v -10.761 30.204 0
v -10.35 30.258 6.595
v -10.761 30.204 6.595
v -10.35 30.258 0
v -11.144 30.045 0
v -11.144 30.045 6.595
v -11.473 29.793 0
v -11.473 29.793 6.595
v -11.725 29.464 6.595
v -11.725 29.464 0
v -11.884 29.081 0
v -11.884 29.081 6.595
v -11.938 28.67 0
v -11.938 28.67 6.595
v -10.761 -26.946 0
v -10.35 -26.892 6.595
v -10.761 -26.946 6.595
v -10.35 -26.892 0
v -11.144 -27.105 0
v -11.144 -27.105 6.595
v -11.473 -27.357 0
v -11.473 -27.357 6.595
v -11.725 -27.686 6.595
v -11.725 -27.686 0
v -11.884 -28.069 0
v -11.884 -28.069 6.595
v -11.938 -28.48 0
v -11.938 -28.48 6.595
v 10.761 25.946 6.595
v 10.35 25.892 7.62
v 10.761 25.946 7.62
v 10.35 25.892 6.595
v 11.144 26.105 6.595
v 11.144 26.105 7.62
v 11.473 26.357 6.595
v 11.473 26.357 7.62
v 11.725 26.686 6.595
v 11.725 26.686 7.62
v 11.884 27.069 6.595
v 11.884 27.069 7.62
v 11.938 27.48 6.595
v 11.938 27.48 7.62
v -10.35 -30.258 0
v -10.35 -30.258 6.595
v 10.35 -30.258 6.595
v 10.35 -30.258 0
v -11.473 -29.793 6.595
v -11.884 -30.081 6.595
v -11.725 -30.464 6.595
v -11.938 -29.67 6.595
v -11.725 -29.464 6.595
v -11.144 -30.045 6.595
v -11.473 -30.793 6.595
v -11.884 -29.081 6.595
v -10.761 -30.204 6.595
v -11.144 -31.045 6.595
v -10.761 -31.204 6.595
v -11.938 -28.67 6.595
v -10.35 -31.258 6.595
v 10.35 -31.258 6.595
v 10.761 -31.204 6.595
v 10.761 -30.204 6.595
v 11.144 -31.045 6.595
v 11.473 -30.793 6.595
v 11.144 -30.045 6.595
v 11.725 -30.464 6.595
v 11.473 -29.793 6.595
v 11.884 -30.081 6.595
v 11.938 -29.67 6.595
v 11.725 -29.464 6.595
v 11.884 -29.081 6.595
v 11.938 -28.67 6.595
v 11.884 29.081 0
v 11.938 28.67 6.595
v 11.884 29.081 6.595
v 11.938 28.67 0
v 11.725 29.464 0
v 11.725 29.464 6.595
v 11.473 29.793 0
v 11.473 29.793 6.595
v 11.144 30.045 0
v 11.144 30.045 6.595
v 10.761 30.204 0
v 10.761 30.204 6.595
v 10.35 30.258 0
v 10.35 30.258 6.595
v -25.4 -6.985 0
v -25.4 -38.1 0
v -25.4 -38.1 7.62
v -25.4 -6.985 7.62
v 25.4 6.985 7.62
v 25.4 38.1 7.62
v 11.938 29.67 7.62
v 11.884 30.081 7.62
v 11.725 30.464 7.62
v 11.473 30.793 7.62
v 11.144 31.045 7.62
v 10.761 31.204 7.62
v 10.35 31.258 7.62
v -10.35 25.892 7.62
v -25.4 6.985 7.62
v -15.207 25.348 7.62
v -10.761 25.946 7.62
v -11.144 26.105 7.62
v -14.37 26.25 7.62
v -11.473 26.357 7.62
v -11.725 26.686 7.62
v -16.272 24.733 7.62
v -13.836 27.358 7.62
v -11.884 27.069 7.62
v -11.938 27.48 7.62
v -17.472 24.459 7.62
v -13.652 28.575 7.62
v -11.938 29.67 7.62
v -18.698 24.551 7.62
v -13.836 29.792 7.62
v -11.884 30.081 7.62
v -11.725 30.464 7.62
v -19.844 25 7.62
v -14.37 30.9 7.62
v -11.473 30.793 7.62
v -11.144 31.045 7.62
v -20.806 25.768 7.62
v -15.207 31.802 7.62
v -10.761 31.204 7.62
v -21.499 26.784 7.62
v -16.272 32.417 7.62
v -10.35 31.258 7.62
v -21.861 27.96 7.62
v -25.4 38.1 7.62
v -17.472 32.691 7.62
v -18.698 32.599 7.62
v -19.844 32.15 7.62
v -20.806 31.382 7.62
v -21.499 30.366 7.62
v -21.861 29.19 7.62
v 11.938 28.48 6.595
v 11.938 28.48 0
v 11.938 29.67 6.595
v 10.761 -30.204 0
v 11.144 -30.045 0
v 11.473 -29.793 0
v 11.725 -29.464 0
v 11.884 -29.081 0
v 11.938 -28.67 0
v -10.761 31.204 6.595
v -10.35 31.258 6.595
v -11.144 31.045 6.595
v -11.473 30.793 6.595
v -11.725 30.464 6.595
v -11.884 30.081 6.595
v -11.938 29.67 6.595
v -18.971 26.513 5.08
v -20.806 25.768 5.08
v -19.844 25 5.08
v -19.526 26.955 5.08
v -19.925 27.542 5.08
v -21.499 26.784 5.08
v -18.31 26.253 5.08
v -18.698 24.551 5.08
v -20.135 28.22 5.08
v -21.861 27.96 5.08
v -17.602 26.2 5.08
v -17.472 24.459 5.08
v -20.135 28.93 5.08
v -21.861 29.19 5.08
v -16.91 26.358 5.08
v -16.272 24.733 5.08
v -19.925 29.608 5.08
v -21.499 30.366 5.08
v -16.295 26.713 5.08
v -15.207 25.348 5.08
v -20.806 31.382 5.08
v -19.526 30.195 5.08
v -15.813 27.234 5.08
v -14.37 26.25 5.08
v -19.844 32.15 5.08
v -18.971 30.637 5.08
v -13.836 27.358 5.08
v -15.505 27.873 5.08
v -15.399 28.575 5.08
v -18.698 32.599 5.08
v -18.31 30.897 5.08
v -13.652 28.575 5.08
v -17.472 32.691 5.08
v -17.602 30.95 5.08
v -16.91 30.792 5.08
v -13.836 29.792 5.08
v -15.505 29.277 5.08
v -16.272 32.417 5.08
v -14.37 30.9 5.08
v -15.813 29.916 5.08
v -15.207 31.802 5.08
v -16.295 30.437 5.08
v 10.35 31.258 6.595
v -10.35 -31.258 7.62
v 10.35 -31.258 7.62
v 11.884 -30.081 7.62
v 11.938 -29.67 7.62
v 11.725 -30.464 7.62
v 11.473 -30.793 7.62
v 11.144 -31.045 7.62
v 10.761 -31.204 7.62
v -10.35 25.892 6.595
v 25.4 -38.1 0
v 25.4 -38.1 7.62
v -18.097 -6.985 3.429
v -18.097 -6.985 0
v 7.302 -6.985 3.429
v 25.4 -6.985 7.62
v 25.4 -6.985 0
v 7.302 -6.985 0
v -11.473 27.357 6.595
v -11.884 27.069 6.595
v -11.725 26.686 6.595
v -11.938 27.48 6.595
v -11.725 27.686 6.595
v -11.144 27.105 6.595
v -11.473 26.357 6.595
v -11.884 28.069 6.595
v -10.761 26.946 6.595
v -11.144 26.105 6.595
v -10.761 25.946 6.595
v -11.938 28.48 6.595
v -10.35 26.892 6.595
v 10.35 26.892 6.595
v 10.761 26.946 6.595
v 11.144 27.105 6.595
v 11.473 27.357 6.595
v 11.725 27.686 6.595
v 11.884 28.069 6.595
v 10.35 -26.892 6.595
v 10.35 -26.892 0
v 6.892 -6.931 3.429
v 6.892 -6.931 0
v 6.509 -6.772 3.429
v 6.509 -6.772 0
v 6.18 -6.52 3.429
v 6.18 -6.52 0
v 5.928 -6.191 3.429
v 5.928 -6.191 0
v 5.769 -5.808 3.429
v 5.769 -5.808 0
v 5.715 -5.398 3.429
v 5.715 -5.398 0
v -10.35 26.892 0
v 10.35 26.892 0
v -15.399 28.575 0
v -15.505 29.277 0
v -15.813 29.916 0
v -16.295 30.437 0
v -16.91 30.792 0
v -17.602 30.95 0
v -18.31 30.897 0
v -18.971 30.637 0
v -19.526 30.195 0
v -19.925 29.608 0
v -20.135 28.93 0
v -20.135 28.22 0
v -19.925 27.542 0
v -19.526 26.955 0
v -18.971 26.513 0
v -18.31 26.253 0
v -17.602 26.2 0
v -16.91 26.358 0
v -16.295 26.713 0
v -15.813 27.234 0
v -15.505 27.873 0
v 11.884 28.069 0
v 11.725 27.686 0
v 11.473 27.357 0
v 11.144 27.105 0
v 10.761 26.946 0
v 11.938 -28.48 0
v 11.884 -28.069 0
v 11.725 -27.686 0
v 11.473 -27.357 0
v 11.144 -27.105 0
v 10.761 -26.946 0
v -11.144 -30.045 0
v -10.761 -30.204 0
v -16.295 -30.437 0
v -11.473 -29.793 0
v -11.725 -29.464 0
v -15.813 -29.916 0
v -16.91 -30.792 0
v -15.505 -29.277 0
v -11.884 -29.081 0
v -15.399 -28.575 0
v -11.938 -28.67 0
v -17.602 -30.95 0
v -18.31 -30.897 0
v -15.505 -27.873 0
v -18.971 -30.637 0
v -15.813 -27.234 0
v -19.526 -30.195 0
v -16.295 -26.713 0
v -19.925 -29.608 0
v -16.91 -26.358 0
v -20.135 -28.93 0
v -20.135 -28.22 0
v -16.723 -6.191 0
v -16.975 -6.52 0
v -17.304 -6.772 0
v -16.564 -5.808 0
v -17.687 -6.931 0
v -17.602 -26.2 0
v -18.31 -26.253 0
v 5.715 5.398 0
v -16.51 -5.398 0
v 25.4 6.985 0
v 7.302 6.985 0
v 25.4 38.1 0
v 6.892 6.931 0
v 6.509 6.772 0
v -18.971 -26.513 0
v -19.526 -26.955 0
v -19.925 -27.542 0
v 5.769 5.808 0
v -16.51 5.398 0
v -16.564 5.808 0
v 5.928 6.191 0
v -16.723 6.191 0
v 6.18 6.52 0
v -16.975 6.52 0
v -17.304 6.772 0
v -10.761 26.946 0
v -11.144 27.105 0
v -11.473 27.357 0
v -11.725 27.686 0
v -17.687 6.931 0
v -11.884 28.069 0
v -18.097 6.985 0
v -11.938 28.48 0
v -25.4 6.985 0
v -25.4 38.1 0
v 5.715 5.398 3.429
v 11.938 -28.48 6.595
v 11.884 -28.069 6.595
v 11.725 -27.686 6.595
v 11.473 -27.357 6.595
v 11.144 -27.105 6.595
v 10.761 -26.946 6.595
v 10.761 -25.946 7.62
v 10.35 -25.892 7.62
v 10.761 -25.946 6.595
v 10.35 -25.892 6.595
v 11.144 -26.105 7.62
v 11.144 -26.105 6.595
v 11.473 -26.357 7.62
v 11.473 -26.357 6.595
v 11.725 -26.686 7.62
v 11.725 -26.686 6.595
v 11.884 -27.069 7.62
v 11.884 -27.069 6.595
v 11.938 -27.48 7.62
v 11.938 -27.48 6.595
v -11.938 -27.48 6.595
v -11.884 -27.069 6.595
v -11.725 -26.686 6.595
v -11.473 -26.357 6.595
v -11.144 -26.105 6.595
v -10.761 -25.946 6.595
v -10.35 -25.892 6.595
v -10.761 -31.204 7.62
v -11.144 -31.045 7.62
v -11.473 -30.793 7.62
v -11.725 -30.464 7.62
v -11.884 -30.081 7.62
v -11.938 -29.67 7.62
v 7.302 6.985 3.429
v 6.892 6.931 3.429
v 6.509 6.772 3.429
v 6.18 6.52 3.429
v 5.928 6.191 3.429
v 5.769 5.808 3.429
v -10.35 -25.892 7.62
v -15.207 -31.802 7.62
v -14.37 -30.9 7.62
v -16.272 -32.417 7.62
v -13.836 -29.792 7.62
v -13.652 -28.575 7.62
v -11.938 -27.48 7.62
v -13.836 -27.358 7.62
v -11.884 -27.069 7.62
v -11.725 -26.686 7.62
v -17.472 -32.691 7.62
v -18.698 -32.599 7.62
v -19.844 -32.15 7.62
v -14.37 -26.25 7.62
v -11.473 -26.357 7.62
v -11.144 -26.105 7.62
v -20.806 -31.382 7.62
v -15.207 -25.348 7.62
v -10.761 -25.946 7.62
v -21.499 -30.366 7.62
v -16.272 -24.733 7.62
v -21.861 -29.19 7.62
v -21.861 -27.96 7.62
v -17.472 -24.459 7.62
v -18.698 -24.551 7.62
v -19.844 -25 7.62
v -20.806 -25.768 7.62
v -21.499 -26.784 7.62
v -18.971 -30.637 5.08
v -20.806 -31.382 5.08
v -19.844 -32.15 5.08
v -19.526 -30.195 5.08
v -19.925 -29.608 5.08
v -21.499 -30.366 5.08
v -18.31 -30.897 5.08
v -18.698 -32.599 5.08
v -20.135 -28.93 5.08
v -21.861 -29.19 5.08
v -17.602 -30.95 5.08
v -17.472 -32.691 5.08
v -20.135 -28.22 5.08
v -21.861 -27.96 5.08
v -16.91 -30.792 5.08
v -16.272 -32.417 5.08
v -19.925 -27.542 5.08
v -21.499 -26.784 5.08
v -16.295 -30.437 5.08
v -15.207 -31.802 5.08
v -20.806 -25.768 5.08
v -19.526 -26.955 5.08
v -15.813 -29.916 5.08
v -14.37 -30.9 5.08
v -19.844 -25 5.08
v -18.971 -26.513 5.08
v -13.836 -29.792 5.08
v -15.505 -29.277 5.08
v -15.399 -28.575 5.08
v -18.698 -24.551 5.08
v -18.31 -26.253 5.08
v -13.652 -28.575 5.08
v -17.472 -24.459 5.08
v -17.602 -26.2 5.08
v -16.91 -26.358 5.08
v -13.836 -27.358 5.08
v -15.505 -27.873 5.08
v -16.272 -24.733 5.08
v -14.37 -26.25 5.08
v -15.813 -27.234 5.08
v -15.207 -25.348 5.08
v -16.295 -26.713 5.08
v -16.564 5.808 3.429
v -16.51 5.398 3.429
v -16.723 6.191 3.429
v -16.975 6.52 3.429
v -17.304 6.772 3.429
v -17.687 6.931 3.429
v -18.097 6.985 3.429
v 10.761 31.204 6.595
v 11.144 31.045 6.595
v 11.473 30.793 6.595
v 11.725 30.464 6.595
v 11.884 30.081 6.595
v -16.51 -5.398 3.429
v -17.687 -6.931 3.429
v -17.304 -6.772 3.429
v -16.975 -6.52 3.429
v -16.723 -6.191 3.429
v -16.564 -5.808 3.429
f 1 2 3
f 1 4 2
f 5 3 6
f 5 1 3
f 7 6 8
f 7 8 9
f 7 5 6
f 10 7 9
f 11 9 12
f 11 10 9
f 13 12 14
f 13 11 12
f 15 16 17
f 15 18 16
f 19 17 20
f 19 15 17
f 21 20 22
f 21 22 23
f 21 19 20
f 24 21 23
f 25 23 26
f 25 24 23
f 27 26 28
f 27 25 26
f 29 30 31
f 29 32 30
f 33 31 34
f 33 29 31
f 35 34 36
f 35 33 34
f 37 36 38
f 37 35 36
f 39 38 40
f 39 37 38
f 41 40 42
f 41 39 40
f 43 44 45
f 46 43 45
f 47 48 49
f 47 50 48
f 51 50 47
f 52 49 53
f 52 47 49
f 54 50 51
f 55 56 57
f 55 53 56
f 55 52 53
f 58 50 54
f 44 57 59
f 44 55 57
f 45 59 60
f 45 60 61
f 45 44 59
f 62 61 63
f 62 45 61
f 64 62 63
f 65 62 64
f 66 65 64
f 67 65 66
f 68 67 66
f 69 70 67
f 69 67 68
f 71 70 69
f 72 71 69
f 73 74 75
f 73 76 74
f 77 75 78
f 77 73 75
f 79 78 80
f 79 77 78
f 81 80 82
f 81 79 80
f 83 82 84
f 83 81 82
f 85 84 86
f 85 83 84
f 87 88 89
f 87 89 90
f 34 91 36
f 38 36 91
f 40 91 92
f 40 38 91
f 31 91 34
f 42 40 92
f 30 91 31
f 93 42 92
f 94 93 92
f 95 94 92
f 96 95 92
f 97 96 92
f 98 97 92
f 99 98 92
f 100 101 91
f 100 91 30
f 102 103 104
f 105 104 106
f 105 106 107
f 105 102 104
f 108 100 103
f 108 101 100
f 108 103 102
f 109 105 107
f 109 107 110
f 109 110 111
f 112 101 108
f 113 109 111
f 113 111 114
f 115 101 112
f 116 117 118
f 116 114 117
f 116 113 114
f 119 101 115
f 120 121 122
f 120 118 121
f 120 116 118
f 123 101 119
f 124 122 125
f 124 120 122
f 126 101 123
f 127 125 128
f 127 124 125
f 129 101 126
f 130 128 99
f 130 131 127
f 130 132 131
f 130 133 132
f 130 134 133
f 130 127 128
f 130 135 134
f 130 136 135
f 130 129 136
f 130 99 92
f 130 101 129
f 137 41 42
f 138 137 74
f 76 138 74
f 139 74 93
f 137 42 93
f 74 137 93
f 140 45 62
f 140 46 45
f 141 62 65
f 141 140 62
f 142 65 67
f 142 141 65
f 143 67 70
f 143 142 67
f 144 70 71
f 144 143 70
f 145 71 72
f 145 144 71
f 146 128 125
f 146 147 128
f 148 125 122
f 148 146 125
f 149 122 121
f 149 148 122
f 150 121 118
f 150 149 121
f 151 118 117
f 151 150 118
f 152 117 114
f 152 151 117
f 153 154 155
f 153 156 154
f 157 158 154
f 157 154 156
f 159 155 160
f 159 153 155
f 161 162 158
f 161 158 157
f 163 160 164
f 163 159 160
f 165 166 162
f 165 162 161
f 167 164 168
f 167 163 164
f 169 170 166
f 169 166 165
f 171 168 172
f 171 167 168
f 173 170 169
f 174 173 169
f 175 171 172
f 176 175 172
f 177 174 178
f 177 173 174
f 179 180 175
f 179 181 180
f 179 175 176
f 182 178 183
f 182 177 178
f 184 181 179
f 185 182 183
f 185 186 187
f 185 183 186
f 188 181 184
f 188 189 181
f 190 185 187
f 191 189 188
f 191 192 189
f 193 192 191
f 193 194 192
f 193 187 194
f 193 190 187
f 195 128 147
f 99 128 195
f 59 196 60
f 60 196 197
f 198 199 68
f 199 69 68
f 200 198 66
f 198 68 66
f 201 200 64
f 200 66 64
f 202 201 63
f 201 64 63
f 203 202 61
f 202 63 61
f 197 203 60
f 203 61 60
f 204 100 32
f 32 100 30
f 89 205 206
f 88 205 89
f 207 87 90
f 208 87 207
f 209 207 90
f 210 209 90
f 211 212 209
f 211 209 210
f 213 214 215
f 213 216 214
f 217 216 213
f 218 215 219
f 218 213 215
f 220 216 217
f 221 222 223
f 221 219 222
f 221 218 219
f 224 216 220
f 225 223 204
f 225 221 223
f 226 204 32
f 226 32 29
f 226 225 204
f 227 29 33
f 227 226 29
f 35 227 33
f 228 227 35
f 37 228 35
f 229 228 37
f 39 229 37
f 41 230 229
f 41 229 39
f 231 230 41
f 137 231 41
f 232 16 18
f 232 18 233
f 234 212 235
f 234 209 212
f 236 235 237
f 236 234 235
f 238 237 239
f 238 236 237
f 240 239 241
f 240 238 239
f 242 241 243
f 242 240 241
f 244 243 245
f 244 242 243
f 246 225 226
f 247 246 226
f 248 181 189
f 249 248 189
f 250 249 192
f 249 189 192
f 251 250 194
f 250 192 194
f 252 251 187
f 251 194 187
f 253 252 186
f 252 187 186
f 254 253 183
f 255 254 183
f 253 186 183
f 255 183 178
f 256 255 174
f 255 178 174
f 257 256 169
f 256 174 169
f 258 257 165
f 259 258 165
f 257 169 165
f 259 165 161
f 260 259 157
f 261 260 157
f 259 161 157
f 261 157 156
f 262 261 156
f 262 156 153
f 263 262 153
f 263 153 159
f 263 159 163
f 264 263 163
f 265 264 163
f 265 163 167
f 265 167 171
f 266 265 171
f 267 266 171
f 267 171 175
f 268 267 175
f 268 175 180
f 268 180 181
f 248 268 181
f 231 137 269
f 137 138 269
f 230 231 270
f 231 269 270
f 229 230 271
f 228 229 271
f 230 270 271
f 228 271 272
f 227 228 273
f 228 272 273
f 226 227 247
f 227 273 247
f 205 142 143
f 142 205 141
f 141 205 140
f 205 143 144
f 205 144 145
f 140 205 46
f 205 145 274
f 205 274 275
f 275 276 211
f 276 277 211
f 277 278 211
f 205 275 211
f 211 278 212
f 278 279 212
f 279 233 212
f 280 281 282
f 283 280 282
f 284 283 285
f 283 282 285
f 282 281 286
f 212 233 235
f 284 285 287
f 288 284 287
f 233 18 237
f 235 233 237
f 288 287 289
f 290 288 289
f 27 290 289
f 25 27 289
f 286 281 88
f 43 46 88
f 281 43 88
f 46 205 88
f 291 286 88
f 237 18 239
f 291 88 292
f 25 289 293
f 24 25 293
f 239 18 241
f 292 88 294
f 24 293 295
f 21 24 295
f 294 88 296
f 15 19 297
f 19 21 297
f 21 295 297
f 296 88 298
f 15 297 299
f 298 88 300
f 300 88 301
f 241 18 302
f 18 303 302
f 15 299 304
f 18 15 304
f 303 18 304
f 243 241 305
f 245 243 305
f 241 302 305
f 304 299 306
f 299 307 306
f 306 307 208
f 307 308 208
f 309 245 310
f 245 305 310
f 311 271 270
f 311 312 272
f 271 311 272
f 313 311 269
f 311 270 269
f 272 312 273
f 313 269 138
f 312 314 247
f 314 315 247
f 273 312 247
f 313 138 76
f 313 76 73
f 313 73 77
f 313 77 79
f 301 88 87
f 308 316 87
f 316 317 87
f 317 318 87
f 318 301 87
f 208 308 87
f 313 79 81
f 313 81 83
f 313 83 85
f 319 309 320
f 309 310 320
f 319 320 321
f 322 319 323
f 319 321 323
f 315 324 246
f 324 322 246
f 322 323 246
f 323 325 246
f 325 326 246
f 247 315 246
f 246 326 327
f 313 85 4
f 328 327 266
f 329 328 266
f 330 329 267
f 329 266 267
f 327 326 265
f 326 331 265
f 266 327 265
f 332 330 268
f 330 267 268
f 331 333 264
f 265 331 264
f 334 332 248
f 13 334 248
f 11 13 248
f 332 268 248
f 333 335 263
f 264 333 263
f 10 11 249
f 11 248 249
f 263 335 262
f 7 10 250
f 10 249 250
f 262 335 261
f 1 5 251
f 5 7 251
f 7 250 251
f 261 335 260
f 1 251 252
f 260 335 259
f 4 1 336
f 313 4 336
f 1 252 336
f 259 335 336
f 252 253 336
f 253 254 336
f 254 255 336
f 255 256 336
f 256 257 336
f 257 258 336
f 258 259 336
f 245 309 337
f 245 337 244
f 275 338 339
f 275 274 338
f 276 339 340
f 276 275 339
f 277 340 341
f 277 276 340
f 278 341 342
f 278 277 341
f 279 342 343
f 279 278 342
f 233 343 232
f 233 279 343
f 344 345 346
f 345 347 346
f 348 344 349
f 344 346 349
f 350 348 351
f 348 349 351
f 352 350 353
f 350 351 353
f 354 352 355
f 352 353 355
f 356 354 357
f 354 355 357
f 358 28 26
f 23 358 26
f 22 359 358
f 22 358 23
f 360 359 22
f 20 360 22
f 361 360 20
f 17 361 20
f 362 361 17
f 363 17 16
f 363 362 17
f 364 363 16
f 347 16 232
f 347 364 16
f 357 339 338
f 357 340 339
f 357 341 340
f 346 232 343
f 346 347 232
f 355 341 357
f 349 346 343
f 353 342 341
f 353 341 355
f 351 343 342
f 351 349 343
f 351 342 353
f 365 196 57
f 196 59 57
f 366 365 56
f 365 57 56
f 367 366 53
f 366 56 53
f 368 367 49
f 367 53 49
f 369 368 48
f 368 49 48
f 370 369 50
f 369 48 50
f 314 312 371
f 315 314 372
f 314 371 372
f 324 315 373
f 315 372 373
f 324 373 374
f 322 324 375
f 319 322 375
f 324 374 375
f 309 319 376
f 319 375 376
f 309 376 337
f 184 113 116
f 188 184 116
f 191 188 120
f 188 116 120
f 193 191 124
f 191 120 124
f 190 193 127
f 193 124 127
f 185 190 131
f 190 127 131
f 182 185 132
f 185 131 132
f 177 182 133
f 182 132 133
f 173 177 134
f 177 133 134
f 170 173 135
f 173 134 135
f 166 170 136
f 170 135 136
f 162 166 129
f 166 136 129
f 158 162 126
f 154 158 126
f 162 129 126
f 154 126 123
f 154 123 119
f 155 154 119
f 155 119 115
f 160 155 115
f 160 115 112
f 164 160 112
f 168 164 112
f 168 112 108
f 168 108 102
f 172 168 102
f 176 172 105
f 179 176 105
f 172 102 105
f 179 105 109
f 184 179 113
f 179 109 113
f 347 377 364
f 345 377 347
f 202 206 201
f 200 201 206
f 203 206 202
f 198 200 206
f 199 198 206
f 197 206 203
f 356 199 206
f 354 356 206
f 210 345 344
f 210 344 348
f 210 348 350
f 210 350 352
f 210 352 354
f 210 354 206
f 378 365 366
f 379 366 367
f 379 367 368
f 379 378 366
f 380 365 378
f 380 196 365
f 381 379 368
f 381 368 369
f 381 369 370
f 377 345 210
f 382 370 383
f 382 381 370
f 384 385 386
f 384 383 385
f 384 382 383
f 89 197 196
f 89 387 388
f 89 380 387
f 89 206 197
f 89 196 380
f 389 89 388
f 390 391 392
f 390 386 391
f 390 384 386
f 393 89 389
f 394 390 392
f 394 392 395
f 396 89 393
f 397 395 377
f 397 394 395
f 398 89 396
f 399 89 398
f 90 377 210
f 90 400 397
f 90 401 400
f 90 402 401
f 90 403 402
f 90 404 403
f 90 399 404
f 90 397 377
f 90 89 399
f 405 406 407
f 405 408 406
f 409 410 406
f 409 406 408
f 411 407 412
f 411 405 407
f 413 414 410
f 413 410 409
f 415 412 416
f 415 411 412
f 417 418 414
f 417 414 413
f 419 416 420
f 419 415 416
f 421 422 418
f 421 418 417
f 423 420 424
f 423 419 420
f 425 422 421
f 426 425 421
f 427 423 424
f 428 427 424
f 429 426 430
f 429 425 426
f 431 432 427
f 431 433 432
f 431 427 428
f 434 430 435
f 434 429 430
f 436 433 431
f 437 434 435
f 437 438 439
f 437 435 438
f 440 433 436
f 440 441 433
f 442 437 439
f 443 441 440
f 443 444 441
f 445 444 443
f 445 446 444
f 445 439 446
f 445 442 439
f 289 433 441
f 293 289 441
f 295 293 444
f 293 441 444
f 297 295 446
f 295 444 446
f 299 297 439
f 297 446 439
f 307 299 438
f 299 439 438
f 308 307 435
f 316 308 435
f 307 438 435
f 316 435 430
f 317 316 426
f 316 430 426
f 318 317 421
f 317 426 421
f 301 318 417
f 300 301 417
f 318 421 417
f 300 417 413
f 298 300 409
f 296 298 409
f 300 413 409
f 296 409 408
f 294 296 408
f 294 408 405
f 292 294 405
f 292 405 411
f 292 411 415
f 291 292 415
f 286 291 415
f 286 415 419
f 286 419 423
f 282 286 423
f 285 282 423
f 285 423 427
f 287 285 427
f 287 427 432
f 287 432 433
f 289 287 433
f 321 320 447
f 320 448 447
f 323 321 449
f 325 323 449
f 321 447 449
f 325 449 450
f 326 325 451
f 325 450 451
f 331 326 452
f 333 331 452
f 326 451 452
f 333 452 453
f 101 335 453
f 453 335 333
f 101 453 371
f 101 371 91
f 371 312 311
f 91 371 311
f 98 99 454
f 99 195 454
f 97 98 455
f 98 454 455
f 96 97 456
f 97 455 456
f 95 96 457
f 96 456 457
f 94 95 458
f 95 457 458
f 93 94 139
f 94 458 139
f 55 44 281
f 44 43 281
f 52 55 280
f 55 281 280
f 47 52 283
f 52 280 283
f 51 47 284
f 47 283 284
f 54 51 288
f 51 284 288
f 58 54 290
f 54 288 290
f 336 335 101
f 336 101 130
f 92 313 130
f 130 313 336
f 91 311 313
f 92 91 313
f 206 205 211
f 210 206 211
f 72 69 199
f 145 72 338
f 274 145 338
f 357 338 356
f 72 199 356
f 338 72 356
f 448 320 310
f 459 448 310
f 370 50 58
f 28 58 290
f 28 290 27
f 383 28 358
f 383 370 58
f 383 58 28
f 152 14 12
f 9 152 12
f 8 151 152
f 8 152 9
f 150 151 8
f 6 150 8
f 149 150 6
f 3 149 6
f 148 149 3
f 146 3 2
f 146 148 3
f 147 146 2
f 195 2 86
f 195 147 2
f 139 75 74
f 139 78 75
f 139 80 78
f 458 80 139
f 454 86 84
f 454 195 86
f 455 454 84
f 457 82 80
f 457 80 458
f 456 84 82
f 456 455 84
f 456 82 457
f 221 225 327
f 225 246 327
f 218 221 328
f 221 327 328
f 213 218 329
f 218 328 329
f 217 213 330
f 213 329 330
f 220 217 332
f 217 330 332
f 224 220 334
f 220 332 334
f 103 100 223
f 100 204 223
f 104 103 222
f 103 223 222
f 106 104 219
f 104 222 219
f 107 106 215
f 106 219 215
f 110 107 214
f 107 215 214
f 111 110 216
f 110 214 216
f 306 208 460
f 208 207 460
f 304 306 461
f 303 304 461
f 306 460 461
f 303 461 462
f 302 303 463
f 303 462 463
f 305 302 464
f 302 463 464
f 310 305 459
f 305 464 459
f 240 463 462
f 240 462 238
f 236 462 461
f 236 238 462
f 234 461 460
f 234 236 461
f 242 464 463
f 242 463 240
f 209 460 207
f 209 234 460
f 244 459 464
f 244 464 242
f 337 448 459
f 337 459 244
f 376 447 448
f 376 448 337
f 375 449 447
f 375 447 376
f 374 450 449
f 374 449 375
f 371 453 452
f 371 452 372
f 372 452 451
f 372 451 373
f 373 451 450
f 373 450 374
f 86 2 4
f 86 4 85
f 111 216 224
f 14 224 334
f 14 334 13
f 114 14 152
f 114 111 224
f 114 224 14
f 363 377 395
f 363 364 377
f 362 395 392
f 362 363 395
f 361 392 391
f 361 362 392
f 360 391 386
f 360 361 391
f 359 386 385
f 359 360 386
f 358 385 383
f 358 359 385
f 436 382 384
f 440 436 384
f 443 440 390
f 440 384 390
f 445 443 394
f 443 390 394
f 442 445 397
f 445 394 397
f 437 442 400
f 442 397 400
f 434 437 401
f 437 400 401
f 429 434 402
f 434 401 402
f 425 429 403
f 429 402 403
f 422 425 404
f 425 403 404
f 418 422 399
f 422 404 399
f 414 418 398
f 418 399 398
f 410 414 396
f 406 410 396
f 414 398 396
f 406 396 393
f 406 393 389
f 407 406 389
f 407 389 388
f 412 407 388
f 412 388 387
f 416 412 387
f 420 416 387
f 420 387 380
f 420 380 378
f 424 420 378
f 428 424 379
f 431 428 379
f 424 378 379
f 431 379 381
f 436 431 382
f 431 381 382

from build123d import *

# Parameters (mm, degrees)
SKETCH1_W           = 76.2
SKETCH1_H           = 50.8
BOSS_EXTRUDE1_DEPTH = 7.62
SKETCH2_W           = 50.8
SKETCH2_H           = 13.97
CUT_EXTRUDE1_DEPTH  = 4.191
SKETCH3_W           = 8.89
SKETCH3_H           = 13.97
SKETCH3_W_2         = 19.685
CUT_EXTRUDE2_DEPTH  = 47.420193882
SKETCH4_R           = 2.38125
CUT_EXTRUDE3_DEPTH  = 47.420193882
SKETCH5_W           = 23.876
SKETCH5_H           = 3.3655
CUT_EXTRUDE4_DEPTH  = 47.420193882
SKETCH6_W           = 23.876
SKETCH6_H           = 1
CUT_EXTRUDE5_DEPTH  = 1.025400032
FILLET3_R           = 1.5875
FILLET6_R           = 1.5875
FILLET7_R           = 1.5875
SKETCH7_R           = 4.1275
CUT_EXTRUDE6_DEPTH  = 2.54


with BuildPart() as part:
    # Sketch1 → Boss-Extrude1 (new body)
    with BuildSketch(Plane(origin=(0, 0, 0), x_dir=(0, 1, 0), z_dir=(0, 0, 1))):
        Rectangle(SKETCH1_W, SKETCH1_H)
    extrude(amount=BOSS_EXTRUDE1_DEPTH)

    # Sketch2 → Cut-Extrude1 (cut)
    with BuildSketch(Plane.XY.offset(7.62)):
        Rectangle(SKETCH2_W, SKETCH2_H)
    extrude(amount=-CUT_EXTRUDE1_DEPTH, mode=Mode.SUBTRACT)

    # Sketch3 → Cut-Extrude2 (cut, through all)
    with BuildSketch(Plane(origin=(0, 0, 0), x_dir=(1, 0, 0), z_dir=(0, 0, -1))):
        with Locations((-20.955, 0)):
            Rectangle(SKETCH3_W, SKETCH3_H)
        with Locations((15.5575, 0)):
            Rectangle(SKETCH3_W_2, SKETCH3_H)
    extrude(amount=-CUT_EXTRUDE2_DEPTH, mode=Mode.SUBTRACT)

    # Sketch4 → Cut-Extrude3 (cut, through all)
    with BuildSketch(Plane.XY.offset(7.62)):
        with Locations((-17.78, 28.575)):
            Circle(SKETCH4_R)
        with Locations((-17.78, -28.575)):
            Circle(SKETCH4_R)
    extrude(amount=-CUT_EXTRUDE3_DEPTH, mode=Mode.SUBTRACT)

    # Sketch5 → Cut-Extrude4 (cut, through all)
    with BuildSketch(Plane.XY.offset(7.62)):
        with Locations((0, 28.575)):
            Rectangle(SKETCH5_W, SKETCH5_H)
        with Locations((0, -28.575)):
            Rectangle(SKETCH5_W, SKETCH5_H)
    extrude(amount=-CUT_EXTRUDE4_DEPTH, mode=Mode.SUBTRACT)

    # Sketch6 → Cut-Extrude5 (cut)
    with BuildSketch(Plane.XY.offset(7.62)):
        with Locations((0, 26.39225)):
            Rectangle(SKETCH6_W, SKETCH6_H)
        with Locations((0, -26.39225)):
            Rectangle(SKETCH6_W, SKETCH6_H)
        with Locations((0, 30.75775)):
            Rectangle(SKETCH6_W, SKETCH6_H)
        with Locations((0, -30.75775)):
            Rectangle(SKETCH6_W, SKETCH6_H)
    extrude(amount=-CUT_EXTRUDE5_DEPTH, mode=Mode.SUBTRACT)

    # Fillet3
    fillet3_edges = [part.edges().sort_by_distance(p)[0] for p in [
        (-16.51, 6.985, 1.7145),
        (-16.51, -6.985, 1.7145),
        (5.715, -6.985, 1.7145),
        (5.715, 6.985, 1.7145),
    ]]
    fillet(fillet3_edges, radius=FILLET3_R)

    # Fillet6
    fillet6_edges = [part.edges().sort_by_distance(p)[0] for p in [
        (-11.938, 30.25775, 3.297299984),
        (11.938, 30.25775, 3.297299984),
        (11.938, 26.89225, 3.297299984),
        (-11.938, 26.89225, 3.297299984),
        (-11.938, -26.89225, 3.297299984),
        (11.938, -26.89225, 3.297299984),
        (11.938, -30.25775, 3.297299984),
        (-11.938, -30.25775, 3.297299984),
    ]]
    fillet(fillet6_edges, radius=FILLET6_R)

    # Fillet7
    fillet7_edges = [part.edges().sort_by_distance(p)[0] for p in [
        (11.938, -31.25775, 7.107299984),
        (-11.938, -31.25775, 7.107299984),
        (-11.938, -25.89225, 7.107299984),
        (11.938, -25.89225, 7.107299984),
        (-11.938, 31.25775, 7.107299984),
        (11.938, 31.25775, 7.107299984),
        (11.938, 25.89225, 7.107299984),
        (-11.938, 25.89225, 7.107299984),
    ]]
    fillet(fillet7_edges, radius=FILLET7_R)

    # Sketch7 → Cut-Extrude6 (cut)
    with BuildSketch(Plane.XY.offset(7.62)):
        with Locations((-17.78, -28.575)):
            Circle(SKETCH7_R)
        with Locations((-17.78, 28.575)):
            Circle(SKETCH7_R)
    extrude(amount=-CUT_EXTRUDE6_DEPTH, mode=Mode.SUBTRACT)


solid = part.part
